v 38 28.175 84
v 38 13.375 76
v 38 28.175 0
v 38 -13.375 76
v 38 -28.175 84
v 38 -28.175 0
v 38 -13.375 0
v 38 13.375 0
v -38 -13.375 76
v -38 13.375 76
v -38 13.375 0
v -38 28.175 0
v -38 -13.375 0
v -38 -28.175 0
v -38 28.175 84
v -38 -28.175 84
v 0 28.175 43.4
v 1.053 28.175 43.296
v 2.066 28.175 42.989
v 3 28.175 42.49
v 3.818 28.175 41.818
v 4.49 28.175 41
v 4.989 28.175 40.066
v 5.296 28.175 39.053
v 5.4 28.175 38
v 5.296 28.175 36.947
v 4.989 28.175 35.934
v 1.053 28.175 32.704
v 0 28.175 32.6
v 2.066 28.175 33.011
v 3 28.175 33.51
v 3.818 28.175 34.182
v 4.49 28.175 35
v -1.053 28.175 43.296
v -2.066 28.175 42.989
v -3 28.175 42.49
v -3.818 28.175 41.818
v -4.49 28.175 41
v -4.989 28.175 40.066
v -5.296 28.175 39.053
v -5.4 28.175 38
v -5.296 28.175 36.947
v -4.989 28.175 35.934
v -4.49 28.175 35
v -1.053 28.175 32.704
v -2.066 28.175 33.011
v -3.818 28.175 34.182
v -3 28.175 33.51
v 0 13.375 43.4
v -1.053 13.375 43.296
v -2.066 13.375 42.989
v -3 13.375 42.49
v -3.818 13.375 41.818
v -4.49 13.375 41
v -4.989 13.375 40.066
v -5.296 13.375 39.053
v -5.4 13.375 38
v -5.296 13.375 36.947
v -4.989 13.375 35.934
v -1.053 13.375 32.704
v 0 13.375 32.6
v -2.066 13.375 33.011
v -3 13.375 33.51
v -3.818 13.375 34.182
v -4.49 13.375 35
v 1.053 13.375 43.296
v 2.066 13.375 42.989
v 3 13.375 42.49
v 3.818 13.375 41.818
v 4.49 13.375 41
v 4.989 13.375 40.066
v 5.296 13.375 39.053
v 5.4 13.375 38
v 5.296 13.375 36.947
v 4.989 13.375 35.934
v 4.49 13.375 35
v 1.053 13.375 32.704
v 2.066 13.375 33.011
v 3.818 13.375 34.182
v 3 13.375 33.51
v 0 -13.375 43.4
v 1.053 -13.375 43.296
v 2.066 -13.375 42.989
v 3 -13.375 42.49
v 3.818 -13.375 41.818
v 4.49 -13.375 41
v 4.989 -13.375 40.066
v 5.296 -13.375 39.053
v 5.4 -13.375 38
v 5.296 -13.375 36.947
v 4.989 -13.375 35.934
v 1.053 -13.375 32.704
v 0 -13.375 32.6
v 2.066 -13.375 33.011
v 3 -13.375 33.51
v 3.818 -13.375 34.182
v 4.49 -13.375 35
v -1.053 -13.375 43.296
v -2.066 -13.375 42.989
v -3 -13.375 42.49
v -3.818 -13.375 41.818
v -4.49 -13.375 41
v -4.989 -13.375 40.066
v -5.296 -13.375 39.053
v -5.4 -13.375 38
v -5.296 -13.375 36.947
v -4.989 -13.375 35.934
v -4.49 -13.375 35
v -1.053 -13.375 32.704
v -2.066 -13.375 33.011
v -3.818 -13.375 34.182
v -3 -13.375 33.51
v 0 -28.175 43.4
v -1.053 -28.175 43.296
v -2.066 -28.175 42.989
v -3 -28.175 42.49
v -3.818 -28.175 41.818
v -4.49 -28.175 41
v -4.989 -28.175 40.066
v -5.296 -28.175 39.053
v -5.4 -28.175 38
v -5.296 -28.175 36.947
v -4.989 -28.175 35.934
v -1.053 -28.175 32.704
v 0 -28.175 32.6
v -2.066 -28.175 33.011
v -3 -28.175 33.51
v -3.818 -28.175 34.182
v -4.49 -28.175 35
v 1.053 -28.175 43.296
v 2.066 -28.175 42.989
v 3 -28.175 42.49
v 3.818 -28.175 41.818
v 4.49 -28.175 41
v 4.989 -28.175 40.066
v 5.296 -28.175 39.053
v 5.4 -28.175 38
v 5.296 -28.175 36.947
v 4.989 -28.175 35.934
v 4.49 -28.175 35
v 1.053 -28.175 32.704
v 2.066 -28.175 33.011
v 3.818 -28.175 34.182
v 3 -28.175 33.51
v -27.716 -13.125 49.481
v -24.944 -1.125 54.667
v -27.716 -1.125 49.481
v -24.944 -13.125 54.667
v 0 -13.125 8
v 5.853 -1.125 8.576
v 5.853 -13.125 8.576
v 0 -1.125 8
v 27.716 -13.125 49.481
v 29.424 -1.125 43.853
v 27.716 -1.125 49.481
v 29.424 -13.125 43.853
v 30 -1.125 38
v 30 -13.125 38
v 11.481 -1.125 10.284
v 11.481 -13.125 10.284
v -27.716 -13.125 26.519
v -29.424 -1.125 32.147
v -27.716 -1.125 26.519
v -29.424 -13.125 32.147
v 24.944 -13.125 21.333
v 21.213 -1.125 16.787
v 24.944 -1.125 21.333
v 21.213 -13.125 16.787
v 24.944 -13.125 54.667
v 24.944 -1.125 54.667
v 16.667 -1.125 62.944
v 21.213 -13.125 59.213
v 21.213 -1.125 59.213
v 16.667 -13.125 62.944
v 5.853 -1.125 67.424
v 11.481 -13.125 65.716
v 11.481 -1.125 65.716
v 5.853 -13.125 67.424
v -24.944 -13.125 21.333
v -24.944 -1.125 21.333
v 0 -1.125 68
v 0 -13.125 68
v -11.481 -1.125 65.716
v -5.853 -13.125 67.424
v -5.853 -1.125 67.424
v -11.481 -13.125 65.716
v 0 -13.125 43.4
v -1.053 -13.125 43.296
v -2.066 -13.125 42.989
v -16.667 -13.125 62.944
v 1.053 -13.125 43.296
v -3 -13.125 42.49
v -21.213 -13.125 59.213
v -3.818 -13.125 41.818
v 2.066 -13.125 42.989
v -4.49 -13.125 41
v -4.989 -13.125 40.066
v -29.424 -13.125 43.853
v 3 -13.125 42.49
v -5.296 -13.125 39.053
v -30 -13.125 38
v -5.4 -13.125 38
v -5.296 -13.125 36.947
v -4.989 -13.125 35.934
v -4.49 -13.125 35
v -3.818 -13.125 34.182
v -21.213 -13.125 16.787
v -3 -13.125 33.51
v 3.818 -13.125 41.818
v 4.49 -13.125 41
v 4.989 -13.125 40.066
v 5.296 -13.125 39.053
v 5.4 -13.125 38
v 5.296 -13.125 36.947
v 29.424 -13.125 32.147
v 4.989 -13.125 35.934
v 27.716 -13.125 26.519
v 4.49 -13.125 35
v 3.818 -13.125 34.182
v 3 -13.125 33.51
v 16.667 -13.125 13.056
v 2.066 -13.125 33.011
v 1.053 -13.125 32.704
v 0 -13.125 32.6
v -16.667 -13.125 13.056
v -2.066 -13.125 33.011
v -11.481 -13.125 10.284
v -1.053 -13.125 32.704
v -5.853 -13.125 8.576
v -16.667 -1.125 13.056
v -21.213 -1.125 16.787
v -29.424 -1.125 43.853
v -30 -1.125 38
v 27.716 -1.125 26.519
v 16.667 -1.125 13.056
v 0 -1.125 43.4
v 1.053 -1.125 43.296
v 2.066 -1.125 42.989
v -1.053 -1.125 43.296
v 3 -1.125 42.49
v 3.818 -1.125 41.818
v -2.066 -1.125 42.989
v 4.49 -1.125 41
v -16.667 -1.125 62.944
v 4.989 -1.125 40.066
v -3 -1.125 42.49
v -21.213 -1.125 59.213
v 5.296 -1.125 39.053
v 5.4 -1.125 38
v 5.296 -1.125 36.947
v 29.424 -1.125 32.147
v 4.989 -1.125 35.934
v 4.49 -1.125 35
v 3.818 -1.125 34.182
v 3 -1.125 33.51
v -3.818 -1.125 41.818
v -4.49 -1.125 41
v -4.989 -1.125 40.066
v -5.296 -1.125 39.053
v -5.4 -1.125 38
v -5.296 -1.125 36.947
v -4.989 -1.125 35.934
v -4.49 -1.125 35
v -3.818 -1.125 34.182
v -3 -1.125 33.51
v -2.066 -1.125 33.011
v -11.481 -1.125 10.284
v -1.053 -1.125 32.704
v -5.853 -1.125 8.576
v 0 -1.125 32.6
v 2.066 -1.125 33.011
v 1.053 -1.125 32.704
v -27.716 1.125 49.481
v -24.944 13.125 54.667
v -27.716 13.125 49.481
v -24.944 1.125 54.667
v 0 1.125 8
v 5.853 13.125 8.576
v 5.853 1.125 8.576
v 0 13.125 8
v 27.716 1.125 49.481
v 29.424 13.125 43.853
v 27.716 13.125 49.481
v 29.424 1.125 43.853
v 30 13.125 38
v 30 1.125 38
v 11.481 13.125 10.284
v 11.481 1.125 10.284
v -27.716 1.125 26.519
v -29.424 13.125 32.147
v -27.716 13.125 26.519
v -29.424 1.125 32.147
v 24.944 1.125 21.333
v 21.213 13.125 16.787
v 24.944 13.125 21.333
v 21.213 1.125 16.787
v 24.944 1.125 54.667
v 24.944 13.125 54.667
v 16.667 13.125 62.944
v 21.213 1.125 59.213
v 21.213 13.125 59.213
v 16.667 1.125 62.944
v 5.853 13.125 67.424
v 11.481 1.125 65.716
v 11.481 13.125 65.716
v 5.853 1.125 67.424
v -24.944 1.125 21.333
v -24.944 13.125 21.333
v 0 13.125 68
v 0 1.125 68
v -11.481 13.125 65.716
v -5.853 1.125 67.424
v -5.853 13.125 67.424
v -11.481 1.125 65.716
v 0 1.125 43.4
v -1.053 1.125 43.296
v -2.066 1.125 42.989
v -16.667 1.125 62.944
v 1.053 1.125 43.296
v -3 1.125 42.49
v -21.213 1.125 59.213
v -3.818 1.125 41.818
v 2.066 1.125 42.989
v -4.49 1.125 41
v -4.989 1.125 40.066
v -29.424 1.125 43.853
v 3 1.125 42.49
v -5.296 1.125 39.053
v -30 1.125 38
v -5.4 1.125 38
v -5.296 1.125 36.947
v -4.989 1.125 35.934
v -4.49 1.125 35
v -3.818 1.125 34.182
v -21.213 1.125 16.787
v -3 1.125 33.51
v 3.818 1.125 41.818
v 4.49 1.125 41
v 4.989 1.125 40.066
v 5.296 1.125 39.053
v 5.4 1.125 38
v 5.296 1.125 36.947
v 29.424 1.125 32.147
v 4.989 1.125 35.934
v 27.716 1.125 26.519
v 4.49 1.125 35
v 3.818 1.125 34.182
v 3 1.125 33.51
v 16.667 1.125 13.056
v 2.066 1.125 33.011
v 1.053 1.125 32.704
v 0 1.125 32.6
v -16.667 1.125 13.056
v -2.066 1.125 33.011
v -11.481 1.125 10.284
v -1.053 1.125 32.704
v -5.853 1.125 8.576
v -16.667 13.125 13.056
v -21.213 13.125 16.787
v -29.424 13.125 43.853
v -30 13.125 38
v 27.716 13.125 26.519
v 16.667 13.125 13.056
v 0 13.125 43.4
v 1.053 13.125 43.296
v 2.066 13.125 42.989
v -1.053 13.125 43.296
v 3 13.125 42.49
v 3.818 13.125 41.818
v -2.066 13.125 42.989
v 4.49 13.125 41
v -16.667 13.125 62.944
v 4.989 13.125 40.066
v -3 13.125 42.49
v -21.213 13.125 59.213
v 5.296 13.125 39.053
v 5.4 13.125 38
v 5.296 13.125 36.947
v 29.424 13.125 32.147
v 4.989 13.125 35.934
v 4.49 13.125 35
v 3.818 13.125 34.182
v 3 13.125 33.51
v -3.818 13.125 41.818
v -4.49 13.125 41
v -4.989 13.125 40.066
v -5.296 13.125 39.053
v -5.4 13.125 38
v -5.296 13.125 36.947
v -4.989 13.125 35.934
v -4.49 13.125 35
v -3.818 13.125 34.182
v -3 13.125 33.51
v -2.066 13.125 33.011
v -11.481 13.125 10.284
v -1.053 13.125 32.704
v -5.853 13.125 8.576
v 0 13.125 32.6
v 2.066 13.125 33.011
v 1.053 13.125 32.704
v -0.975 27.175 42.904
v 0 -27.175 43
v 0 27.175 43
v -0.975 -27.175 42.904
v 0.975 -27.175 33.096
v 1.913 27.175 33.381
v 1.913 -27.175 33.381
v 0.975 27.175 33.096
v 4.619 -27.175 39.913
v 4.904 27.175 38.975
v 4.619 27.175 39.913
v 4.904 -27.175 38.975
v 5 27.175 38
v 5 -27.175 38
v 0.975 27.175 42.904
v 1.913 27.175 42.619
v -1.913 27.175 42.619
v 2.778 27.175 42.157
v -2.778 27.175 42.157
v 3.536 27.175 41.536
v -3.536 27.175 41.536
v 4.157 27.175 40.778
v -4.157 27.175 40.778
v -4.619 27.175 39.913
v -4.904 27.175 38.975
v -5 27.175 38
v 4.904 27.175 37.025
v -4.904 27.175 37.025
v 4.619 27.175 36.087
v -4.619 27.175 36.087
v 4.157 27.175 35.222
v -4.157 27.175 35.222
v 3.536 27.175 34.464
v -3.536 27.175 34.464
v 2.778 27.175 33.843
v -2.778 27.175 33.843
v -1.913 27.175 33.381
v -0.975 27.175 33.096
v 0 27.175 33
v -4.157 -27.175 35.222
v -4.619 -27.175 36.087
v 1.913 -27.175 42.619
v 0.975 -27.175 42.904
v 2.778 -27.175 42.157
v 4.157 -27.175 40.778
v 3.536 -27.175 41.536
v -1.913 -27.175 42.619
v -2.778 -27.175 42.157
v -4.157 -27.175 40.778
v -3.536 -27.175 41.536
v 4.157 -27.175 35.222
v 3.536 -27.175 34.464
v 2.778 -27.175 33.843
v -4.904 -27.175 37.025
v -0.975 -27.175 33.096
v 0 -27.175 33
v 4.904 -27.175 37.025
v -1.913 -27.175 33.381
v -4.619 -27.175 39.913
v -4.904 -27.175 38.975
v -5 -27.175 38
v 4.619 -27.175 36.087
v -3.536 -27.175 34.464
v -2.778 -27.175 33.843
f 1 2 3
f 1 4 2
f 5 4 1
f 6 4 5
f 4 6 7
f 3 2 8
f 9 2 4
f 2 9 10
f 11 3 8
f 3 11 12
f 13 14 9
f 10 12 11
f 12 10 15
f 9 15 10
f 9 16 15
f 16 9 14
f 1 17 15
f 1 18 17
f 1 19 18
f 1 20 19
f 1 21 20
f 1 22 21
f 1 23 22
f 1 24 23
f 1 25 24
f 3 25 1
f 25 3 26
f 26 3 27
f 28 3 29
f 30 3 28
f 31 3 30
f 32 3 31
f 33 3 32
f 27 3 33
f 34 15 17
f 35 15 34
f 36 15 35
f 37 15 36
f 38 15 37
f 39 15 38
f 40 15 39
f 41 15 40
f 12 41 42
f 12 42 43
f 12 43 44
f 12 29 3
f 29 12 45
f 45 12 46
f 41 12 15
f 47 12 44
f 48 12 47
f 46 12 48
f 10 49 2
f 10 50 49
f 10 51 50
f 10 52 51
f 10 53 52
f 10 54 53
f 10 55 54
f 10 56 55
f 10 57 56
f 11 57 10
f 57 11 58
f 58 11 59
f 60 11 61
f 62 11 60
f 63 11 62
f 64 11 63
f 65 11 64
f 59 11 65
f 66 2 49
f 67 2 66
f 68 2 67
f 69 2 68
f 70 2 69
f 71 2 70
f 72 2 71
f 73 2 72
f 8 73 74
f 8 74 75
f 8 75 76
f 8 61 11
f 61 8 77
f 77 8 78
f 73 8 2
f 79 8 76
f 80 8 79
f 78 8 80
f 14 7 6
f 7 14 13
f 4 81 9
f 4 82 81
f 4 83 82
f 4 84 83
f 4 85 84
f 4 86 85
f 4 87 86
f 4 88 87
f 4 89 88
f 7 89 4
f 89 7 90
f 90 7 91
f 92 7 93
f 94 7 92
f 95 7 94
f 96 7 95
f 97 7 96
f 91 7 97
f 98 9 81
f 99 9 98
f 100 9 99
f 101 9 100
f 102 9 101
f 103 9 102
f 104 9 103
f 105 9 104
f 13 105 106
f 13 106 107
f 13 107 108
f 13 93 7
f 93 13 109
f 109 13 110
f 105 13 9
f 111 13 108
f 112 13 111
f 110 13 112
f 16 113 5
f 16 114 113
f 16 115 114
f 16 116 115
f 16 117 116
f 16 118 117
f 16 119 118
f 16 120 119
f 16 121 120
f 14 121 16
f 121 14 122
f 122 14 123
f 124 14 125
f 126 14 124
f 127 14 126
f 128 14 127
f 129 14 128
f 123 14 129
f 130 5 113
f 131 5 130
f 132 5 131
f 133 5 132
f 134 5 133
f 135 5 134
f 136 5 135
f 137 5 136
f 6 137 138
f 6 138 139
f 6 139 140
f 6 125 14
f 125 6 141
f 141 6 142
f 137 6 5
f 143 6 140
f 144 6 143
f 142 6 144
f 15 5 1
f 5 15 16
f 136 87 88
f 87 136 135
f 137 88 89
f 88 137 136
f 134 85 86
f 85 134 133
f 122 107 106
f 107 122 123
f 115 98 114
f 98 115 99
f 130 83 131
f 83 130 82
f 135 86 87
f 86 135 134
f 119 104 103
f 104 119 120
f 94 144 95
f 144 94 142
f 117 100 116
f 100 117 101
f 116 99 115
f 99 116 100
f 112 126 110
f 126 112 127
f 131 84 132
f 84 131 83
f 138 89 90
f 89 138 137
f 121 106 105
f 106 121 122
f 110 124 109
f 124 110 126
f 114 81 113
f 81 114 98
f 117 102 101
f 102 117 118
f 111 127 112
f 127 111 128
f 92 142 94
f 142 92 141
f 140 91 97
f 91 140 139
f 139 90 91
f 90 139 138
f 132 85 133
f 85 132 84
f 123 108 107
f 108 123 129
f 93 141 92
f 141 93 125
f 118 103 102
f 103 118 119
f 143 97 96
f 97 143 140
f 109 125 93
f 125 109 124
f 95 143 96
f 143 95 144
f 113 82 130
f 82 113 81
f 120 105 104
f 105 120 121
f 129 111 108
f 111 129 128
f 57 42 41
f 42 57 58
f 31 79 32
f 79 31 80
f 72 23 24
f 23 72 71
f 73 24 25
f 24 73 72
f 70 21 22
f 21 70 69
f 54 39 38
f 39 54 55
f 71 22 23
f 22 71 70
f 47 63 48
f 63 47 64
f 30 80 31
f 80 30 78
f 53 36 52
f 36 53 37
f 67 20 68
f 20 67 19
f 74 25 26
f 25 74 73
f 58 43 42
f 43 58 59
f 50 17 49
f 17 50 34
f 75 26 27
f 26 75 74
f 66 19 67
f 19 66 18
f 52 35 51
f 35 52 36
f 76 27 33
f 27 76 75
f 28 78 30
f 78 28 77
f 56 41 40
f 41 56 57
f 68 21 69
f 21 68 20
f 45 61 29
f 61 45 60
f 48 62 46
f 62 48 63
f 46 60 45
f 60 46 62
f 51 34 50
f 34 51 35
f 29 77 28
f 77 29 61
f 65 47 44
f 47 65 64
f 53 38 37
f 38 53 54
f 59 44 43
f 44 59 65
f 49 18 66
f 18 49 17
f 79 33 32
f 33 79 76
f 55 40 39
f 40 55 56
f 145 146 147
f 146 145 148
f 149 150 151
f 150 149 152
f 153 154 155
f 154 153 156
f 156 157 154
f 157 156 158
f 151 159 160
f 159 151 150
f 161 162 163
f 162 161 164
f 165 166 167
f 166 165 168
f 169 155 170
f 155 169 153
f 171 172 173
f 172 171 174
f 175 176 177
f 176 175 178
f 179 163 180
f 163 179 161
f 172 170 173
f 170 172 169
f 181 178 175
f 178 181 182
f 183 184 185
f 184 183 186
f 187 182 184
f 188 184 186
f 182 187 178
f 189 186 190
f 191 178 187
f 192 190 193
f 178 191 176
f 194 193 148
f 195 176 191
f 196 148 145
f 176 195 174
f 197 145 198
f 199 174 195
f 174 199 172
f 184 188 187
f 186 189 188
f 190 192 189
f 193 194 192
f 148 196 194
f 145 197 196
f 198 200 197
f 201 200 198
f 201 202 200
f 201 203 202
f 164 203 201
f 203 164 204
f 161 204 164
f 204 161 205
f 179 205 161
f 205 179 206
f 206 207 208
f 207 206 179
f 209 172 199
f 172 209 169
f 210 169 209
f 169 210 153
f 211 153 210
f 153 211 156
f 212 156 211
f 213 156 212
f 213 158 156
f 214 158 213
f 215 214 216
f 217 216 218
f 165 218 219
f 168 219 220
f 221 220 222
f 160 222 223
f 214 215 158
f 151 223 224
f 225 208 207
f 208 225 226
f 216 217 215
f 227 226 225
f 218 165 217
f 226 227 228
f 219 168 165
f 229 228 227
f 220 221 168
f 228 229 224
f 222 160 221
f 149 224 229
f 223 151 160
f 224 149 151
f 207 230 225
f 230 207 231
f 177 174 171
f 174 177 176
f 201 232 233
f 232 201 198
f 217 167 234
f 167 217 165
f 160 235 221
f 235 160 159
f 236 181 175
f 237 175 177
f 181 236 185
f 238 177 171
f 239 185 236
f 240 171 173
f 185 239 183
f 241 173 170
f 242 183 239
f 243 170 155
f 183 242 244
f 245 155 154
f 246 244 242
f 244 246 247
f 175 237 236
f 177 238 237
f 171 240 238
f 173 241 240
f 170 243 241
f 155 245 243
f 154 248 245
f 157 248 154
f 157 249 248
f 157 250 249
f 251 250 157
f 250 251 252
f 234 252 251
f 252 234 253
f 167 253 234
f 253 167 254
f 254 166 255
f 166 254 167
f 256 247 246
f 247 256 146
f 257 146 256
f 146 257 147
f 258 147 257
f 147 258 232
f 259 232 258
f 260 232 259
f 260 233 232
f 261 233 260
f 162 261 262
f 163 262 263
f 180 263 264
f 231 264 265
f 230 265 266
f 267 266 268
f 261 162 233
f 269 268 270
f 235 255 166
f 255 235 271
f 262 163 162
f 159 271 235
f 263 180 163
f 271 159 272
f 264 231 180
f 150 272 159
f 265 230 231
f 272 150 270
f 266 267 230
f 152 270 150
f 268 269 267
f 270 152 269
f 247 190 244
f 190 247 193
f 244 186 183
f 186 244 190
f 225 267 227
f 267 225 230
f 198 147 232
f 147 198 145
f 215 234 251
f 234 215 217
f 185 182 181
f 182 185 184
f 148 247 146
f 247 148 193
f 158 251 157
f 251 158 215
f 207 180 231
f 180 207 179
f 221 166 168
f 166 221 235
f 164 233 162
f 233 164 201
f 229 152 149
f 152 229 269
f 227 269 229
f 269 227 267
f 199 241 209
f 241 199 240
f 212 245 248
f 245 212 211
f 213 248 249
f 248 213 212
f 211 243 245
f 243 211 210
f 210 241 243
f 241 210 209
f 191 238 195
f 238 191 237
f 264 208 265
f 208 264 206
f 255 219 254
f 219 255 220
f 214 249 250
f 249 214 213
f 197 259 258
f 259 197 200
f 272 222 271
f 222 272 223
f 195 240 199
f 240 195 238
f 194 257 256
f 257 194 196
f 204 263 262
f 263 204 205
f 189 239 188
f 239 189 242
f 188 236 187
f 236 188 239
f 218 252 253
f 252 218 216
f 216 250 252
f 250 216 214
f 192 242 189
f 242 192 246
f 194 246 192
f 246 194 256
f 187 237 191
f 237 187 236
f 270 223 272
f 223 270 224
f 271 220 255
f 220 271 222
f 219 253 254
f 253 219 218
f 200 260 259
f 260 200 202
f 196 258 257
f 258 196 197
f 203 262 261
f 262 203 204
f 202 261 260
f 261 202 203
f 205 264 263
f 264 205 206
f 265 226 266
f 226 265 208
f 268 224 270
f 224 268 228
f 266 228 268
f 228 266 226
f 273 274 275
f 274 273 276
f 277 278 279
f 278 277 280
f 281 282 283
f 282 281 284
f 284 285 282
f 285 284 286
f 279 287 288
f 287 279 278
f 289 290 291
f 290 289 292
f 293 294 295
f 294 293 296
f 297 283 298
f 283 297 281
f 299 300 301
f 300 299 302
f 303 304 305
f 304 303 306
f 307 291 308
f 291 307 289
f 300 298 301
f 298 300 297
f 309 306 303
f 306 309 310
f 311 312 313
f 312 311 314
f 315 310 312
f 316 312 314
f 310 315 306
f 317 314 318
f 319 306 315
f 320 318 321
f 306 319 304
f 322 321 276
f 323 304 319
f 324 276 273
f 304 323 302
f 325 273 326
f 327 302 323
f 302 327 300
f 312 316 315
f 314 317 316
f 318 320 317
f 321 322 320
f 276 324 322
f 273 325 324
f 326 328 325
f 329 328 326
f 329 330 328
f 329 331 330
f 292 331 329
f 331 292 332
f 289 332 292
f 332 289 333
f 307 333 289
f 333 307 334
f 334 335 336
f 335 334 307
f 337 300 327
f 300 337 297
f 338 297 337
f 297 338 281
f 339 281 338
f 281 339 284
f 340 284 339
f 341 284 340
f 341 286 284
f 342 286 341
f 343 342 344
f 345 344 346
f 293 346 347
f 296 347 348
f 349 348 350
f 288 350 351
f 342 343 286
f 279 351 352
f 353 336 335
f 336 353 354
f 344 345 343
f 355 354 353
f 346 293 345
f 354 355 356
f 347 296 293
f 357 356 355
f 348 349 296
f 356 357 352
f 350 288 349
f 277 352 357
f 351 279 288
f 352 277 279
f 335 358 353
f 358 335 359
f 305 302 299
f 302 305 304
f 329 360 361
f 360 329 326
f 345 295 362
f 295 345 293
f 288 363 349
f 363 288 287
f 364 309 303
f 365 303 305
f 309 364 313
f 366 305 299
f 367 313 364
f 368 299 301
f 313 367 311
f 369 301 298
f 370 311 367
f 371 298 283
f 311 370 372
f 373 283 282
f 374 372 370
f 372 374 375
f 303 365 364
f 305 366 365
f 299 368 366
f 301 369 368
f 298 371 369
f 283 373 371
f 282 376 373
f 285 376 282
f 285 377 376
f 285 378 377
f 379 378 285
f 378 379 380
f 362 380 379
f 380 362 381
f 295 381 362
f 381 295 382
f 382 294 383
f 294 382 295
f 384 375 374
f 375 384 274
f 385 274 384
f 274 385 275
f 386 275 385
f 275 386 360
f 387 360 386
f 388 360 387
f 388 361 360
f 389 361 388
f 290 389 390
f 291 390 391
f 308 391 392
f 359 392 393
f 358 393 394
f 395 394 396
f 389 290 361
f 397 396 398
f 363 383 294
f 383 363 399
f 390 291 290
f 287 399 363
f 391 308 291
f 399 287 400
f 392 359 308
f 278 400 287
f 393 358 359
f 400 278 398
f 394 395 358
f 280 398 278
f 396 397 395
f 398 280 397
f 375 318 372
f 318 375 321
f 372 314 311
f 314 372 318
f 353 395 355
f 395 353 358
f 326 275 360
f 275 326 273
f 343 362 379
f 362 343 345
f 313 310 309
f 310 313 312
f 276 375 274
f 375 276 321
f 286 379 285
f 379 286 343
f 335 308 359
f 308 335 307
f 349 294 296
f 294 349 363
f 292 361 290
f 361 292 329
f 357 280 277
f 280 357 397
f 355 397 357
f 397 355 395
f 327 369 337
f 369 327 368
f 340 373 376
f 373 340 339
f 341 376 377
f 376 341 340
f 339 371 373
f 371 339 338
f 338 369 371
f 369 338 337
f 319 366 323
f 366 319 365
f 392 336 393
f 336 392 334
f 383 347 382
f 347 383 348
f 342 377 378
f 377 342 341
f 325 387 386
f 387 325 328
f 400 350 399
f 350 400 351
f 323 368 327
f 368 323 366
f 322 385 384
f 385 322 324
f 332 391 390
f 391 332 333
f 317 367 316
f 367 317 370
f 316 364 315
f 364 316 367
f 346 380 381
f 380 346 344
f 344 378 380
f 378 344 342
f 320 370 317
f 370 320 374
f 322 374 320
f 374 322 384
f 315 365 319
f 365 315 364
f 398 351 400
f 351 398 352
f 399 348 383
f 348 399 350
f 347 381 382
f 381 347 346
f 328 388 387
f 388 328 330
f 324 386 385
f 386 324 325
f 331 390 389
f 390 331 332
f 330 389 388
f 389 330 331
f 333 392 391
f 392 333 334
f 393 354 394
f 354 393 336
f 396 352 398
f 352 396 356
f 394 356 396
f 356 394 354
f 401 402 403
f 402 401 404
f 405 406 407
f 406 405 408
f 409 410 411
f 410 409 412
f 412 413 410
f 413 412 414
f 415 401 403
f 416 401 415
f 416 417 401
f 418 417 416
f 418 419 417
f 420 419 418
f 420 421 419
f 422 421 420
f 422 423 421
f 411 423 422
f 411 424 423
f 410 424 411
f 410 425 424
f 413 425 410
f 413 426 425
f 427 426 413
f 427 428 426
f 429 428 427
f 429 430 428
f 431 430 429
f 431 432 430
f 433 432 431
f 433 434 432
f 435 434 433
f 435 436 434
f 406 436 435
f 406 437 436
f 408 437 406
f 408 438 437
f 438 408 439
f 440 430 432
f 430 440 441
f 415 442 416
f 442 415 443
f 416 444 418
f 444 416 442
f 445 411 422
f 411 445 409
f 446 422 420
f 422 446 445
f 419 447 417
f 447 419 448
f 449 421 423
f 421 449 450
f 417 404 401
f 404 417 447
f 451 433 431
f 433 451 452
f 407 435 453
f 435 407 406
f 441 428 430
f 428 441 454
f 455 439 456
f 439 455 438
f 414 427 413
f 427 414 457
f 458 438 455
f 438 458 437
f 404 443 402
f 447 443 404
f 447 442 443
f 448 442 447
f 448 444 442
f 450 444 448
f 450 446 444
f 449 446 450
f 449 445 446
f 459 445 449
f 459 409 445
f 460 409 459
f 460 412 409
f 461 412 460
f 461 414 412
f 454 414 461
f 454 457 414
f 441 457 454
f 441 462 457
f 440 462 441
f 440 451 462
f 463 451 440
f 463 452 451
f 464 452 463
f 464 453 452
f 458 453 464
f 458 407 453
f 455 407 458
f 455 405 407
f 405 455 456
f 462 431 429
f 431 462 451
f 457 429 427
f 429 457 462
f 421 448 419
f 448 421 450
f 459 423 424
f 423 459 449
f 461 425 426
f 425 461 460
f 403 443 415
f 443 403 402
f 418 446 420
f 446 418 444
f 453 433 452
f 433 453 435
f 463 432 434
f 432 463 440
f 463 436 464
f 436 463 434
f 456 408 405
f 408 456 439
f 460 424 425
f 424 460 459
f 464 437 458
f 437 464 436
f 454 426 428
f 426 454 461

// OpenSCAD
$fn = 32;

// ------------------------------------------------------------------------
// Trolley wheel set: wheels d60, fork 76 mm tall
// Every part is its own module, assembly() places every instance.
// ------------------------------------------------------------------------

// --- part 1 ---
module trolley_fork() {
  difference() {
    union() {
      translate([-38, 13.375, 0]) cube([76, 14.8, 76]);
      translate([-38, -28.175, 0]) cube([76, 14.8, 76]);
      translate([-38, -28.175, 76]) cube([76, 56.35, 8]);
    }
    translate([0, -20.775, 38]) rotate([90, 0, 0]) cylinder(h = 16.8, d = 10.8, center = true);
    translate([0, 20.775, 38]) rotate([90, 0, 0]) cylinder(h = 16.8, d = 10.8, center = true);
  }
}

// --- part 2 ---
module trolley_wheel() {
  difference() {
      translate([0, 0, 0]) cylinder(h = 12, d = 60);
      translate([0, 0, -1]) cylinder(h = 14, d = 10.8);
    }
}

// --- part 3 ---
module trolley_axle() {
  translate([0, 0, -27.175]) cylinder(h = 54.35, d = 10);
}

// --- assembly ---
module assembly() {
  color([0.80, 0.24, 0.20]) translate([0, 0, 0]) rotate([0, 0, 0]) trolley_fork();
  color([0.20, 0.45, 0.75]) translate([0, -1.125, 38]) rotate([90, 0, 0]) trolley_wheel();
  color([0.25, 0.62, 0.32]) translate([0, 13.125, 38]) rotate([90, 0, 0]) trolley_wheel();
  color([0.92, 0.70, 0.18]) translate([0, 0, 38]) rotate([90, 0, 0]) trolley_axle();
}

assembly();
